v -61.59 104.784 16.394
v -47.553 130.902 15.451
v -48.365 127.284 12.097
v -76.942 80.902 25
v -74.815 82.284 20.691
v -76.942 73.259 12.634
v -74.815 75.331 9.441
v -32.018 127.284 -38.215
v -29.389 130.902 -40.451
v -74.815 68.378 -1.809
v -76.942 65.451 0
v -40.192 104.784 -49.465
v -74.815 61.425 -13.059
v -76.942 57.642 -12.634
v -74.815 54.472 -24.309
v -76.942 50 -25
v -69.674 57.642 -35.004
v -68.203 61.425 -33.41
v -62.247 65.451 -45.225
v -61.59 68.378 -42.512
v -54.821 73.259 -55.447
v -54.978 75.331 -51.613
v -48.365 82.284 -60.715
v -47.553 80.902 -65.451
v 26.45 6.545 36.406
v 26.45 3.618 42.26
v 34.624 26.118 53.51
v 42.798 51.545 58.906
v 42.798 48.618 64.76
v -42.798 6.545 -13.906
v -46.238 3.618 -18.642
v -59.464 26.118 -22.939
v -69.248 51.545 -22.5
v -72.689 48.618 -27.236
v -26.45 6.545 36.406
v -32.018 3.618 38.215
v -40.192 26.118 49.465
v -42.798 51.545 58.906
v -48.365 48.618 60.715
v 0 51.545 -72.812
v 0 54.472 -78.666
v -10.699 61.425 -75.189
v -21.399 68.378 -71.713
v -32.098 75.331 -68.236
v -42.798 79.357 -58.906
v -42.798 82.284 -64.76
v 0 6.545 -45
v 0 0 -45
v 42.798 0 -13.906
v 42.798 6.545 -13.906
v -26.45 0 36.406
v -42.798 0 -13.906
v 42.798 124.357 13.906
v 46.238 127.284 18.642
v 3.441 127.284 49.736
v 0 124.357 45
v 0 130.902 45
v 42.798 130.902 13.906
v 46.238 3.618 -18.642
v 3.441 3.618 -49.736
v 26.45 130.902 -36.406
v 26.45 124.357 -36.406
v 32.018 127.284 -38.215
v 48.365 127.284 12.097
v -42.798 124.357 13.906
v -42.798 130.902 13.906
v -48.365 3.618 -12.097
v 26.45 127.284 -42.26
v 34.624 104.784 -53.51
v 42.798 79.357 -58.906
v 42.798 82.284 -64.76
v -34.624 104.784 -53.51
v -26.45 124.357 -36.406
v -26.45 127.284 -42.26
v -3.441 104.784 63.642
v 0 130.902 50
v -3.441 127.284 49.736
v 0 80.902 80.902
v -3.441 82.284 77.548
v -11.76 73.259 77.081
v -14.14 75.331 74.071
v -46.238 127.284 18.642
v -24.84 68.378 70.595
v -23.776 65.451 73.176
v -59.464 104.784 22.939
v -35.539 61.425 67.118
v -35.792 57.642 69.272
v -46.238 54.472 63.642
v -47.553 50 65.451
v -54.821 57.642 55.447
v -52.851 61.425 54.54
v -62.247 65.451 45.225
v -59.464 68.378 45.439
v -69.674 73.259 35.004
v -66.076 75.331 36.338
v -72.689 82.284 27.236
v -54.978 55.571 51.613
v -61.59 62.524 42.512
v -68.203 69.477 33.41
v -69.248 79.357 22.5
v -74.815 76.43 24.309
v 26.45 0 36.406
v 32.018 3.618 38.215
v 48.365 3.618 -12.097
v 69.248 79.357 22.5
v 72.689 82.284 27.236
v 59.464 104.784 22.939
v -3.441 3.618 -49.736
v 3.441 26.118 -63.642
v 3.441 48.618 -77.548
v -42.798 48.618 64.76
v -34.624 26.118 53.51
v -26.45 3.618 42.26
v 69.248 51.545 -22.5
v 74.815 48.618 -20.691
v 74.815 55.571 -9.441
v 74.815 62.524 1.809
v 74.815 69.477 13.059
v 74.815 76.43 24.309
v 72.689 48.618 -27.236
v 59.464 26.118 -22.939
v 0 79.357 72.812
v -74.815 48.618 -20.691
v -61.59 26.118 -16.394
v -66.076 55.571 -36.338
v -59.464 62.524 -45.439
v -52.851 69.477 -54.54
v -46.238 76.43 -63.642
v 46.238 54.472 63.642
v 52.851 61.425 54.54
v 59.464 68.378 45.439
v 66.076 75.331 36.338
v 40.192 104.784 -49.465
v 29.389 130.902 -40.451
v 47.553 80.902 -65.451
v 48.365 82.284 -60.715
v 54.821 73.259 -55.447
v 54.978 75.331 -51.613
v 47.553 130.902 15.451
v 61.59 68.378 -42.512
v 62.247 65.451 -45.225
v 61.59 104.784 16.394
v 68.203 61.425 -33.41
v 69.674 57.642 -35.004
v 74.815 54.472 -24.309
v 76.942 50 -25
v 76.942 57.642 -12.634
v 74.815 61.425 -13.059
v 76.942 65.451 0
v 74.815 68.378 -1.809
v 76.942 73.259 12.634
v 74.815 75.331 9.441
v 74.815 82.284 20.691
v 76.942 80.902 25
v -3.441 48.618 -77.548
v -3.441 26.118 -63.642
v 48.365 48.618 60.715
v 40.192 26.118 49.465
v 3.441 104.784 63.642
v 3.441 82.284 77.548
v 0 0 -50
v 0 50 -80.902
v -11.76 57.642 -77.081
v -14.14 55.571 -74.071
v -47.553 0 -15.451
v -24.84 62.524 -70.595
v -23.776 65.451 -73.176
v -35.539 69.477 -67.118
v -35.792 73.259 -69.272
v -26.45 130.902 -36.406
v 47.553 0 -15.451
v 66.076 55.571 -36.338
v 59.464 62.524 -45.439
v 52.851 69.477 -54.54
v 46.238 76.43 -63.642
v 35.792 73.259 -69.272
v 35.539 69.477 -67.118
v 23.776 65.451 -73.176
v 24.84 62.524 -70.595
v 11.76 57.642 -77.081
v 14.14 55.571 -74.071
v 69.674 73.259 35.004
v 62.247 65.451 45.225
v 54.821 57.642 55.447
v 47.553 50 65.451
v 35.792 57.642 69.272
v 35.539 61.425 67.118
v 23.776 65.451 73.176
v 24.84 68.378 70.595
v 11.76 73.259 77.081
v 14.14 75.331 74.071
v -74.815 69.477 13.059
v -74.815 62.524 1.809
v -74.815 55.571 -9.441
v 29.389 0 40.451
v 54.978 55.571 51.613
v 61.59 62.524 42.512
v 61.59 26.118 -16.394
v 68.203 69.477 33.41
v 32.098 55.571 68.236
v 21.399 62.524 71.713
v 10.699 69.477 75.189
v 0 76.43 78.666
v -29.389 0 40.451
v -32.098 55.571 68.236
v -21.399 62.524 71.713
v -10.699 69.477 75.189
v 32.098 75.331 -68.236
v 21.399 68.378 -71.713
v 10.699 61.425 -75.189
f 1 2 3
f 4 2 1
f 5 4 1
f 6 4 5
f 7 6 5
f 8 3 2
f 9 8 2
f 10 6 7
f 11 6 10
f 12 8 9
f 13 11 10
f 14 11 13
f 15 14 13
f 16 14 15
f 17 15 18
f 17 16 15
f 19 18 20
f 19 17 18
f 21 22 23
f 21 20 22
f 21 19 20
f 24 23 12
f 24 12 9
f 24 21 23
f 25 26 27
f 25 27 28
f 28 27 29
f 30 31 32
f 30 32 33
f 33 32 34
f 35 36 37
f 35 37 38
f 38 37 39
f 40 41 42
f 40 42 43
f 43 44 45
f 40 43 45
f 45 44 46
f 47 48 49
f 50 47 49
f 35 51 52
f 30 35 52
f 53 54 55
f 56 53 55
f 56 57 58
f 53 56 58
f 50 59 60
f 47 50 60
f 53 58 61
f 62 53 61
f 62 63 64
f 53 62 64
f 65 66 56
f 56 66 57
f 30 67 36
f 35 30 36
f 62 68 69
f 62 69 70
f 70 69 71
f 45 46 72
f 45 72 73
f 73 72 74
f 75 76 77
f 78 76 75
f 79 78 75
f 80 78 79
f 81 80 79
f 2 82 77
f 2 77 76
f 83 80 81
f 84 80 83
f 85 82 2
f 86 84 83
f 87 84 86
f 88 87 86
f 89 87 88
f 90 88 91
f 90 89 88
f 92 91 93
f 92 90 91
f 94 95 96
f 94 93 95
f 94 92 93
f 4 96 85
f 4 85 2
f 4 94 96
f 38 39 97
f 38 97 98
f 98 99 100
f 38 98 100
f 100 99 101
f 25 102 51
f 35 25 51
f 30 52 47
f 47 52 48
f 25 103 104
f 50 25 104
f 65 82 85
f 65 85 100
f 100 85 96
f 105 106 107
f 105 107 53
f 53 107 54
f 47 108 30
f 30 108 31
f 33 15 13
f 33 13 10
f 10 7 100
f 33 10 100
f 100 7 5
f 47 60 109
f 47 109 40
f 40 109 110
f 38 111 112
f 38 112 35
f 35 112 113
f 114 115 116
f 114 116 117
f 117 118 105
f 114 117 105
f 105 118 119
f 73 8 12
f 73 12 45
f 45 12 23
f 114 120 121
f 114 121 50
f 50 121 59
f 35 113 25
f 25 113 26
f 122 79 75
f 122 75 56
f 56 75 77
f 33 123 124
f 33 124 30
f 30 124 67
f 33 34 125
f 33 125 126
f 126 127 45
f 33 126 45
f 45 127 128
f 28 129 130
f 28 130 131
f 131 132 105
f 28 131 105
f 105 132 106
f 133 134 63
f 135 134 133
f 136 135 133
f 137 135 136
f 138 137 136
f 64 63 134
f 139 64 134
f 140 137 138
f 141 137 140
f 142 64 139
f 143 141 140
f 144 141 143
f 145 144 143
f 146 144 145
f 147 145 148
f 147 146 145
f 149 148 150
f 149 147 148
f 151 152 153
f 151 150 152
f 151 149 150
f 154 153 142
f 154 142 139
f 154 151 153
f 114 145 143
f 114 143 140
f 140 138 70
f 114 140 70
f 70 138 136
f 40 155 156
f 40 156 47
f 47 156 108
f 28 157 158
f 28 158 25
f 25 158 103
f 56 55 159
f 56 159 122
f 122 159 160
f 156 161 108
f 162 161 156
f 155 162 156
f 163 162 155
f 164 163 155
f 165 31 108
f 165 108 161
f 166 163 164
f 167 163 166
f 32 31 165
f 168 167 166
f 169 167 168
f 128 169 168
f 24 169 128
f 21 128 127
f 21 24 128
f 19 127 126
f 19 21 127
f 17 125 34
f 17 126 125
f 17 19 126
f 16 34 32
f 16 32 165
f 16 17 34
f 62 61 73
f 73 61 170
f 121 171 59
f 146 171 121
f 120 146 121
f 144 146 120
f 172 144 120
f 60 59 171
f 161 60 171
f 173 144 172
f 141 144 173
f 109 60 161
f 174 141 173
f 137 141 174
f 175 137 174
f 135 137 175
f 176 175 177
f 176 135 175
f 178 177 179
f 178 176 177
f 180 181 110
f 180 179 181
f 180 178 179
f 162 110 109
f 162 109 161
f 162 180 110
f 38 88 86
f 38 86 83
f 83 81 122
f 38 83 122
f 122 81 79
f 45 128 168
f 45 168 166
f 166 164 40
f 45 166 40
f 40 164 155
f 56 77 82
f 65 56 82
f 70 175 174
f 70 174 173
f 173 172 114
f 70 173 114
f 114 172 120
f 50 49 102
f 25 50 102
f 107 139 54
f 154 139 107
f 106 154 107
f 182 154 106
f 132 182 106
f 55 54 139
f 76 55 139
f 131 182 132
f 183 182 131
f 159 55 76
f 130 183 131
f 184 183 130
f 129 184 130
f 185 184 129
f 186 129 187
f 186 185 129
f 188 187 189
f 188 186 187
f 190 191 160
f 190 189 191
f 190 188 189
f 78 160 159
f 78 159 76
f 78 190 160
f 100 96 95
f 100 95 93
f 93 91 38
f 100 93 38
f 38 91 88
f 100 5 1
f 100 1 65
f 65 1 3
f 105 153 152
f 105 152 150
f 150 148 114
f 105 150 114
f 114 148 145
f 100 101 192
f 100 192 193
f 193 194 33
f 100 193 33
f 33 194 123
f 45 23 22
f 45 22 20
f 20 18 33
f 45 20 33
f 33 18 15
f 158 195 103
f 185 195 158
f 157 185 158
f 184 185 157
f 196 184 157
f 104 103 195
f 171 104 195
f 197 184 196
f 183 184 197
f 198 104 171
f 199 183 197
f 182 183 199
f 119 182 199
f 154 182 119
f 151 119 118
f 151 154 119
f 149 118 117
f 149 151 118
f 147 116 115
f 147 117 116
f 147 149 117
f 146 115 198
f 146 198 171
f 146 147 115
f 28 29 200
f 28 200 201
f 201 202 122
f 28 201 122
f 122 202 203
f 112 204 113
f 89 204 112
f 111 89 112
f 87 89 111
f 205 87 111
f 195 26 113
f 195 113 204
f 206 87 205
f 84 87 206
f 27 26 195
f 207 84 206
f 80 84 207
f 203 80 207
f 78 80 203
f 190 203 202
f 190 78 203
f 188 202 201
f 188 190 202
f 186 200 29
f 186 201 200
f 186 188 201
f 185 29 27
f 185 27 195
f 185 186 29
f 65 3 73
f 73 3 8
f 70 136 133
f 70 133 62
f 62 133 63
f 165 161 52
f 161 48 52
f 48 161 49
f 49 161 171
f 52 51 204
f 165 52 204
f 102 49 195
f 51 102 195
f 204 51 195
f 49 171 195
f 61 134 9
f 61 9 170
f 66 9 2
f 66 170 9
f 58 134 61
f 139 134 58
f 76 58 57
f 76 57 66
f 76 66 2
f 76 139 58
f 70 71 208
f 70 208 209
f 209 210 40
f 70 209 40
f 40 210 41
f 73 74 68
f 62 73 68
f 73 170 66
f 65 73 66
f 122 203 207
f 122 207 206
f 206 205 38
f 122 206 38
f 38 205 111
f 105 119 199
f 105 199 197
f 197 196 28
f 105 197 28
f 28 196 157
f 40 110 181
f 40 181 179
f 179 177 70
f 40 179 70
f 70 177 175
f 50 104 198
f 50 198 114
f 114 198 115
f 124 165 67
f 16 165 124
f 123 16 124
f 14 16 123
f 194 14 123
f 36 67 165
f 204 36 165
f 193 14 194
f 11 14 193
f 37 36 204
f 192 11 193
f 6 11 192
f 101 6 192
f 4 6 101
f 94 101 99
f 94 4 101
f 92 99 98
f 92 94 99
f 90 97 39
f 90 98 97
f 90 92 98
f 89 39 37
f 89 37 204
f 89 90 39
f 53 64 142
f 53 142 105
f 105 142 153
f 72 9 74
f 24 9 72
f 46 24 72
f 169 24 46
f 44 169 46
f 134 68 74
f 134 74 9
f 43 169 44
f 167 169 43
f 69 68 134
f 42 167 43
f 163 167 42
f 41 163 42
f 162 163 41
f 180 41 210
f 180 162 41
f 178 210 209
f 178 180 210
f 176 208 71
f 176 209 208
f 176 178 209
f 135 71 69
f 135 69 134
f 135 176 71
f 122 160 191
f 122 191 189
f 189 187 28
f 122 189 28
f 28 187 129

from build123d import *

# Parameters (mm, degrees)
CREATION_EXTRUDE_DEPTH = 130.901699304
CREATION_EXTRUDE_TAPER = -26.56505118
SKETCH2_OUTSIDE_W      = 455.432
SKETCH2_OUTSIDE_H      = 443.246
CREATION_CUT_DEPTH     = 130.901699304
CREATION_CUT_TAPER     = 26.56505118
CUT_EXTRUDE_A_DEPTH    = 25.4
A_INV_DEPTH            = 25.4
CUT_EXTRUDE_B_DEPTH    = 25.4
B_INV_DEPTH            = 25.4
CUT_EXTRUDE_C_DEPTH    = 25.4
C_INV_DEPTH            = 25.4
CUT_EXTRUDE_D_DEPTH    = 25.4
D_INV_DEPTH            = 25.4
CUT_EXTRUDE_E_DEPTH    = 25.4
E_INV_DEPTH            = 25.4
CUT_EXTRUDE_F_DEPTH    = 25.4
F_INV_DEPTH            = 25.4


with BuildPart() as part:
    # Sketch1 → creation_extrude (new body)
    with BuildSketch(Plane(origin=(0, 0, 0), x_dir=(1, 0, 0), z_dir=(0, 1, 0))):
        Polygon((0, 49.999999949), (-47.552825766, 15.450849703), (-29.389262585, -40.450849677), (29.389262585, -40.450849677), (47.552825766, 15.450849703), align=None)
    extrude(amount=CREATION_EXTRUDE_DEPTH, taper=CREATION_EXTRUDE_TAPER)

    # Sketch2 outside → creation_cut (cut)
    with BuildSketch(Plane(origin=(0, 130.901699304, 0), x_dir=(1, 0, 0), z_dir=(0, 1, 0))):
        with Locations((0, 12.5)):
            Rectangle(SKETCH2_OUTSIDE_W, SKETCH2_OUTSIDE_H)
        Polygon((0, -49.999999949), (47.552825766, -15.450849703), (29.389262585, 40.450849677), (-29.389262585, 40.450849677), (-47.552825766, -15.450849703), align=None, mode=Mode.SUBTRACT)
    extrude(amount=-CREATION_CUT_DEPTH, taper=CREATION_CUT_TAPER, mode=Mode.SUBTRACT)

    # Sketch3 → Cut-Extrude A (cut)
    with BuildSketch(Plane(origin=(0, 130.901699304, 0), x_dir=(1, 0, 0), z_dir=(0, 1, 0))):
        Polygon((0, -44.999999954), (42.79754319, -13.905764733), (26.450336326, 36.40576471), (-26.450336326, 36.40576471), (-42.79754319, -13.905764733), align=None)
    extrude(amount=-CUT_EXTRUDE_A_DEPTH, mode=Mode.SUBTRACT)

    # Sketch4 → A_inv (cut)
    with BuildSketch(Plane.XZ):
        Polygon((0, -44.999999954), (42.79754319, -13.905764733), (26.450336326, 36.40576471), (-26.450336326, 36.40576471), (-42.79754319, -13.905764733), align=None)
    extrude(amount=-A_INV_DEPTH, mode=Mode.SUBTRACT)

    # Sketch5 → Cut-Extrude B (cut)
    with BuildSketch(Plane(origin=(0, 42.360679738, -84.721359466), x_dir=(-1, 0, 0), z_dir=(-9.08060963965006e-15, 0.4472135955455734, -0.8944271909771081))):
        Polygon((-42.797543189, 44.635254864), (1e-09, 13.541019643), (42.79754319, 44.635254866), (26.450336325, 94.946784308), (-26.450336327, 94.946784307), align=None)
    extrude(amount=-CUT_EXTRUDE_B_DEPTH, mode=Mode.SUBTRACT)

    # Sketch6 → B_inv (cut)
    with BuildSketch(Plane(origin=(0, -16.180339872, 32.36067974), x_dir=(1, 0, 0), z_dir=(4.012362398915141e-15, -0.44721359554557344, 0.8944271909771081))):
        Polygon((-42.797543187, 72.446784338), (-26.450336325, 22.135254895), (26.450336328, 22.135254894), (42.797543192, 72.446784336), (3e-09, 103.541019559), align=None)
    extrude(amount=-B_INV_DEPTH, mode=Mode.SUBTRACT)

    # Sketch7 → Cut-Extrude C (cut)
    with BuildSketch(Plane(origin=(80.574800989, 42.360679738, -26.180339862), x_dir=(-0.24464430830200606, -0.12861712429362887, -0.9610446387935736), z_dir=(0.8506508083303457, 0.44721359554557377, -0.2763932022429817))):
        Polygon((35.93427446, 50.325575991), (12.522250638, 97.763517638), (-39.828626118, 90.15648997), (-48.771223472, 38.017146671), (-1.947175829, 13.400288029), align=None)
    extrude(amount=-CUT_EXTRUDE_C_DEPTH, mode=Mode.SUBTRACT)

    # Sketch8 → C_inv (cut)
    with BuildSketch(Plane(origin=(-30.776835339, -16.180339872, 9.999999989), x_dir=(0.2446443083020028, 0.12861712429362696, 0.9610446387935747), z_dir=(-0.8506508083303469, -0.4472135955455736, 0.27639320224297786))):
        Polygon((-31.935023341, 77.848060657), (-22.992425992, 25.708717357), (29.358450763, 18.101689683), (52.77047459, 65.539631327), (14.889024305, 102.464919293), align=None)
    extrude(amount=-C_INV_DEPTH, mode=Mode.SUBTRACT)

    # Sketch9 → Cut-Extrude D (cut)
    with BuildSketch(Plane(origin=(49.797965648, 42.360679738, 68.541019594), x_dir=(0.8506508083603209, -0.27639320226847824, -0.44721359547279954), z_dir=(0.5257311121057348, 0.44721359554557366, 0.7236067977315217))):
        Polygon((-4.184405192, 98.473361345), (-54.495934634, 82.126154482), (-54.495934634, 29.22548183), (-4.184405192, 12.878274966), (26.90983003, 55.675818156), align=None)
    extrude(amount=-CUT_EXTRUDE_D_DEPTH, mode=Mode.SUBTRACT)

    # Sketch10 → D_inv (cut)
    with BuildSketch(Plane(origin=(-19.021130306, -16.180339872, -26.180339859), x_dir=(-0.8506508083603233, 0.27639320226847536, 0.44721359547279665), z_dir=(-0.5257311121057309, -0.44721359554557344, -0.7236067977315247))):
        Polygon((31.995934659, 98.473361351), (-18.315594783, 82.126154488), (-18.315594783, 29.225481836), (31.995934659, 12.878274972), (63.090169881, 55.675818162), align=None)
    extrude(amount=-D_INV_DEPTH, mode=Mode.SUBTRACT)

    # Sketch11 → Cut-Extrude E (cut)
    with BuildSketch(Plane(origin=(-49.797965648, 42.360679738, 68.541019594), x_dir=(0.8506508083603298, 0.2763932022684677, 0.447213595472789), z_dir=(-0.5257311121057203, 0.44721359554557355, 0.7236067977315324))):
        Polygon((4.184405192, 98.473361345), (-26.90983003, 55.675818156), (4.184405192, 12.878274966), (54.495934634, 29.22548183), (54.495934634, 82.126154482), align=None)
    extrude(amount=-CUT_EXTRUDE_E_DEPTH, mode=Mode.SUBTRACT)

    # Sketch12 → E_inv (cut)
    with BuildSketch(Plane(origin=(19.021130306, -16.180339872, -26.180339859), x_dir=(-0.8506508083603274, -0.27639320226847064, -0.44721359547279194), z_dir=(0.5257311121057243, -0.44721359554557355, -0.7236067977315294))):
        Polygon((-31.99593466, 98.473361351), (-63.090169881, 55.67581816), (-31.995934658, 12.878274972), (18.315594784, 29.225481837), (18.315594782, 82.126154489), align=None)
    extrude(amount=-E_INV_DEPTH, mode=Mode.SUBTRACT)

    # Sketch13 → Cut-Extrude F (cut)
    with BuildSketch(Plane(origin=(-80.574800989, 42.360679738, -26.180339862), x_dir=(-0.2446443083019911, 0.12861712429362016, 0.9610446387935785), z_dir=(-0.8506508083303512, 0.44721359554557344, -0.2763932022429644))):
        Polygon((-12.522250637, 97.763517637), (-35.934274461, 50.325575991), (1.947175826, 13.400288027), (48.771223471, 38.017146666), (39.828626119, 90.156489966), align=None)
    extrude(amount=-CUT_EXTRUDE_F_DEPTH, mode=Mode.SUBTRACT)

    # Sketch14 → F_inv (cut)
    with BuildSketch(Plane(origin=(30.776835339, -16.180339872, 9.999999989), x_dir=(0.2446443083019939, -0.12861712429362177, -0.9610446387935776), z_dir=(0.8506508083303502, -0.4472135955455736, 0.2763932022429676))):
        Polygon((-29.358450768, 18.101689686), (22.992425988, 25.708717353), (31.935023344, 77.848060652), (-14.889024299, 102.464919294), (-52.770474589, 65.539631333), align=None)
    extrude(amount=-F_INV_DEPTH, mode=Mode.SUBTRACT)


with BuildPart() as f_inv_kept_piece:
    # of the separate pieces the step leaves, the one the design keeps (f_inv_pieces_kept)
    add(part.part.solids().sort_by_distance((0, 0, -49.999999949))[0])


solid = f_inv_kept_piece.part
